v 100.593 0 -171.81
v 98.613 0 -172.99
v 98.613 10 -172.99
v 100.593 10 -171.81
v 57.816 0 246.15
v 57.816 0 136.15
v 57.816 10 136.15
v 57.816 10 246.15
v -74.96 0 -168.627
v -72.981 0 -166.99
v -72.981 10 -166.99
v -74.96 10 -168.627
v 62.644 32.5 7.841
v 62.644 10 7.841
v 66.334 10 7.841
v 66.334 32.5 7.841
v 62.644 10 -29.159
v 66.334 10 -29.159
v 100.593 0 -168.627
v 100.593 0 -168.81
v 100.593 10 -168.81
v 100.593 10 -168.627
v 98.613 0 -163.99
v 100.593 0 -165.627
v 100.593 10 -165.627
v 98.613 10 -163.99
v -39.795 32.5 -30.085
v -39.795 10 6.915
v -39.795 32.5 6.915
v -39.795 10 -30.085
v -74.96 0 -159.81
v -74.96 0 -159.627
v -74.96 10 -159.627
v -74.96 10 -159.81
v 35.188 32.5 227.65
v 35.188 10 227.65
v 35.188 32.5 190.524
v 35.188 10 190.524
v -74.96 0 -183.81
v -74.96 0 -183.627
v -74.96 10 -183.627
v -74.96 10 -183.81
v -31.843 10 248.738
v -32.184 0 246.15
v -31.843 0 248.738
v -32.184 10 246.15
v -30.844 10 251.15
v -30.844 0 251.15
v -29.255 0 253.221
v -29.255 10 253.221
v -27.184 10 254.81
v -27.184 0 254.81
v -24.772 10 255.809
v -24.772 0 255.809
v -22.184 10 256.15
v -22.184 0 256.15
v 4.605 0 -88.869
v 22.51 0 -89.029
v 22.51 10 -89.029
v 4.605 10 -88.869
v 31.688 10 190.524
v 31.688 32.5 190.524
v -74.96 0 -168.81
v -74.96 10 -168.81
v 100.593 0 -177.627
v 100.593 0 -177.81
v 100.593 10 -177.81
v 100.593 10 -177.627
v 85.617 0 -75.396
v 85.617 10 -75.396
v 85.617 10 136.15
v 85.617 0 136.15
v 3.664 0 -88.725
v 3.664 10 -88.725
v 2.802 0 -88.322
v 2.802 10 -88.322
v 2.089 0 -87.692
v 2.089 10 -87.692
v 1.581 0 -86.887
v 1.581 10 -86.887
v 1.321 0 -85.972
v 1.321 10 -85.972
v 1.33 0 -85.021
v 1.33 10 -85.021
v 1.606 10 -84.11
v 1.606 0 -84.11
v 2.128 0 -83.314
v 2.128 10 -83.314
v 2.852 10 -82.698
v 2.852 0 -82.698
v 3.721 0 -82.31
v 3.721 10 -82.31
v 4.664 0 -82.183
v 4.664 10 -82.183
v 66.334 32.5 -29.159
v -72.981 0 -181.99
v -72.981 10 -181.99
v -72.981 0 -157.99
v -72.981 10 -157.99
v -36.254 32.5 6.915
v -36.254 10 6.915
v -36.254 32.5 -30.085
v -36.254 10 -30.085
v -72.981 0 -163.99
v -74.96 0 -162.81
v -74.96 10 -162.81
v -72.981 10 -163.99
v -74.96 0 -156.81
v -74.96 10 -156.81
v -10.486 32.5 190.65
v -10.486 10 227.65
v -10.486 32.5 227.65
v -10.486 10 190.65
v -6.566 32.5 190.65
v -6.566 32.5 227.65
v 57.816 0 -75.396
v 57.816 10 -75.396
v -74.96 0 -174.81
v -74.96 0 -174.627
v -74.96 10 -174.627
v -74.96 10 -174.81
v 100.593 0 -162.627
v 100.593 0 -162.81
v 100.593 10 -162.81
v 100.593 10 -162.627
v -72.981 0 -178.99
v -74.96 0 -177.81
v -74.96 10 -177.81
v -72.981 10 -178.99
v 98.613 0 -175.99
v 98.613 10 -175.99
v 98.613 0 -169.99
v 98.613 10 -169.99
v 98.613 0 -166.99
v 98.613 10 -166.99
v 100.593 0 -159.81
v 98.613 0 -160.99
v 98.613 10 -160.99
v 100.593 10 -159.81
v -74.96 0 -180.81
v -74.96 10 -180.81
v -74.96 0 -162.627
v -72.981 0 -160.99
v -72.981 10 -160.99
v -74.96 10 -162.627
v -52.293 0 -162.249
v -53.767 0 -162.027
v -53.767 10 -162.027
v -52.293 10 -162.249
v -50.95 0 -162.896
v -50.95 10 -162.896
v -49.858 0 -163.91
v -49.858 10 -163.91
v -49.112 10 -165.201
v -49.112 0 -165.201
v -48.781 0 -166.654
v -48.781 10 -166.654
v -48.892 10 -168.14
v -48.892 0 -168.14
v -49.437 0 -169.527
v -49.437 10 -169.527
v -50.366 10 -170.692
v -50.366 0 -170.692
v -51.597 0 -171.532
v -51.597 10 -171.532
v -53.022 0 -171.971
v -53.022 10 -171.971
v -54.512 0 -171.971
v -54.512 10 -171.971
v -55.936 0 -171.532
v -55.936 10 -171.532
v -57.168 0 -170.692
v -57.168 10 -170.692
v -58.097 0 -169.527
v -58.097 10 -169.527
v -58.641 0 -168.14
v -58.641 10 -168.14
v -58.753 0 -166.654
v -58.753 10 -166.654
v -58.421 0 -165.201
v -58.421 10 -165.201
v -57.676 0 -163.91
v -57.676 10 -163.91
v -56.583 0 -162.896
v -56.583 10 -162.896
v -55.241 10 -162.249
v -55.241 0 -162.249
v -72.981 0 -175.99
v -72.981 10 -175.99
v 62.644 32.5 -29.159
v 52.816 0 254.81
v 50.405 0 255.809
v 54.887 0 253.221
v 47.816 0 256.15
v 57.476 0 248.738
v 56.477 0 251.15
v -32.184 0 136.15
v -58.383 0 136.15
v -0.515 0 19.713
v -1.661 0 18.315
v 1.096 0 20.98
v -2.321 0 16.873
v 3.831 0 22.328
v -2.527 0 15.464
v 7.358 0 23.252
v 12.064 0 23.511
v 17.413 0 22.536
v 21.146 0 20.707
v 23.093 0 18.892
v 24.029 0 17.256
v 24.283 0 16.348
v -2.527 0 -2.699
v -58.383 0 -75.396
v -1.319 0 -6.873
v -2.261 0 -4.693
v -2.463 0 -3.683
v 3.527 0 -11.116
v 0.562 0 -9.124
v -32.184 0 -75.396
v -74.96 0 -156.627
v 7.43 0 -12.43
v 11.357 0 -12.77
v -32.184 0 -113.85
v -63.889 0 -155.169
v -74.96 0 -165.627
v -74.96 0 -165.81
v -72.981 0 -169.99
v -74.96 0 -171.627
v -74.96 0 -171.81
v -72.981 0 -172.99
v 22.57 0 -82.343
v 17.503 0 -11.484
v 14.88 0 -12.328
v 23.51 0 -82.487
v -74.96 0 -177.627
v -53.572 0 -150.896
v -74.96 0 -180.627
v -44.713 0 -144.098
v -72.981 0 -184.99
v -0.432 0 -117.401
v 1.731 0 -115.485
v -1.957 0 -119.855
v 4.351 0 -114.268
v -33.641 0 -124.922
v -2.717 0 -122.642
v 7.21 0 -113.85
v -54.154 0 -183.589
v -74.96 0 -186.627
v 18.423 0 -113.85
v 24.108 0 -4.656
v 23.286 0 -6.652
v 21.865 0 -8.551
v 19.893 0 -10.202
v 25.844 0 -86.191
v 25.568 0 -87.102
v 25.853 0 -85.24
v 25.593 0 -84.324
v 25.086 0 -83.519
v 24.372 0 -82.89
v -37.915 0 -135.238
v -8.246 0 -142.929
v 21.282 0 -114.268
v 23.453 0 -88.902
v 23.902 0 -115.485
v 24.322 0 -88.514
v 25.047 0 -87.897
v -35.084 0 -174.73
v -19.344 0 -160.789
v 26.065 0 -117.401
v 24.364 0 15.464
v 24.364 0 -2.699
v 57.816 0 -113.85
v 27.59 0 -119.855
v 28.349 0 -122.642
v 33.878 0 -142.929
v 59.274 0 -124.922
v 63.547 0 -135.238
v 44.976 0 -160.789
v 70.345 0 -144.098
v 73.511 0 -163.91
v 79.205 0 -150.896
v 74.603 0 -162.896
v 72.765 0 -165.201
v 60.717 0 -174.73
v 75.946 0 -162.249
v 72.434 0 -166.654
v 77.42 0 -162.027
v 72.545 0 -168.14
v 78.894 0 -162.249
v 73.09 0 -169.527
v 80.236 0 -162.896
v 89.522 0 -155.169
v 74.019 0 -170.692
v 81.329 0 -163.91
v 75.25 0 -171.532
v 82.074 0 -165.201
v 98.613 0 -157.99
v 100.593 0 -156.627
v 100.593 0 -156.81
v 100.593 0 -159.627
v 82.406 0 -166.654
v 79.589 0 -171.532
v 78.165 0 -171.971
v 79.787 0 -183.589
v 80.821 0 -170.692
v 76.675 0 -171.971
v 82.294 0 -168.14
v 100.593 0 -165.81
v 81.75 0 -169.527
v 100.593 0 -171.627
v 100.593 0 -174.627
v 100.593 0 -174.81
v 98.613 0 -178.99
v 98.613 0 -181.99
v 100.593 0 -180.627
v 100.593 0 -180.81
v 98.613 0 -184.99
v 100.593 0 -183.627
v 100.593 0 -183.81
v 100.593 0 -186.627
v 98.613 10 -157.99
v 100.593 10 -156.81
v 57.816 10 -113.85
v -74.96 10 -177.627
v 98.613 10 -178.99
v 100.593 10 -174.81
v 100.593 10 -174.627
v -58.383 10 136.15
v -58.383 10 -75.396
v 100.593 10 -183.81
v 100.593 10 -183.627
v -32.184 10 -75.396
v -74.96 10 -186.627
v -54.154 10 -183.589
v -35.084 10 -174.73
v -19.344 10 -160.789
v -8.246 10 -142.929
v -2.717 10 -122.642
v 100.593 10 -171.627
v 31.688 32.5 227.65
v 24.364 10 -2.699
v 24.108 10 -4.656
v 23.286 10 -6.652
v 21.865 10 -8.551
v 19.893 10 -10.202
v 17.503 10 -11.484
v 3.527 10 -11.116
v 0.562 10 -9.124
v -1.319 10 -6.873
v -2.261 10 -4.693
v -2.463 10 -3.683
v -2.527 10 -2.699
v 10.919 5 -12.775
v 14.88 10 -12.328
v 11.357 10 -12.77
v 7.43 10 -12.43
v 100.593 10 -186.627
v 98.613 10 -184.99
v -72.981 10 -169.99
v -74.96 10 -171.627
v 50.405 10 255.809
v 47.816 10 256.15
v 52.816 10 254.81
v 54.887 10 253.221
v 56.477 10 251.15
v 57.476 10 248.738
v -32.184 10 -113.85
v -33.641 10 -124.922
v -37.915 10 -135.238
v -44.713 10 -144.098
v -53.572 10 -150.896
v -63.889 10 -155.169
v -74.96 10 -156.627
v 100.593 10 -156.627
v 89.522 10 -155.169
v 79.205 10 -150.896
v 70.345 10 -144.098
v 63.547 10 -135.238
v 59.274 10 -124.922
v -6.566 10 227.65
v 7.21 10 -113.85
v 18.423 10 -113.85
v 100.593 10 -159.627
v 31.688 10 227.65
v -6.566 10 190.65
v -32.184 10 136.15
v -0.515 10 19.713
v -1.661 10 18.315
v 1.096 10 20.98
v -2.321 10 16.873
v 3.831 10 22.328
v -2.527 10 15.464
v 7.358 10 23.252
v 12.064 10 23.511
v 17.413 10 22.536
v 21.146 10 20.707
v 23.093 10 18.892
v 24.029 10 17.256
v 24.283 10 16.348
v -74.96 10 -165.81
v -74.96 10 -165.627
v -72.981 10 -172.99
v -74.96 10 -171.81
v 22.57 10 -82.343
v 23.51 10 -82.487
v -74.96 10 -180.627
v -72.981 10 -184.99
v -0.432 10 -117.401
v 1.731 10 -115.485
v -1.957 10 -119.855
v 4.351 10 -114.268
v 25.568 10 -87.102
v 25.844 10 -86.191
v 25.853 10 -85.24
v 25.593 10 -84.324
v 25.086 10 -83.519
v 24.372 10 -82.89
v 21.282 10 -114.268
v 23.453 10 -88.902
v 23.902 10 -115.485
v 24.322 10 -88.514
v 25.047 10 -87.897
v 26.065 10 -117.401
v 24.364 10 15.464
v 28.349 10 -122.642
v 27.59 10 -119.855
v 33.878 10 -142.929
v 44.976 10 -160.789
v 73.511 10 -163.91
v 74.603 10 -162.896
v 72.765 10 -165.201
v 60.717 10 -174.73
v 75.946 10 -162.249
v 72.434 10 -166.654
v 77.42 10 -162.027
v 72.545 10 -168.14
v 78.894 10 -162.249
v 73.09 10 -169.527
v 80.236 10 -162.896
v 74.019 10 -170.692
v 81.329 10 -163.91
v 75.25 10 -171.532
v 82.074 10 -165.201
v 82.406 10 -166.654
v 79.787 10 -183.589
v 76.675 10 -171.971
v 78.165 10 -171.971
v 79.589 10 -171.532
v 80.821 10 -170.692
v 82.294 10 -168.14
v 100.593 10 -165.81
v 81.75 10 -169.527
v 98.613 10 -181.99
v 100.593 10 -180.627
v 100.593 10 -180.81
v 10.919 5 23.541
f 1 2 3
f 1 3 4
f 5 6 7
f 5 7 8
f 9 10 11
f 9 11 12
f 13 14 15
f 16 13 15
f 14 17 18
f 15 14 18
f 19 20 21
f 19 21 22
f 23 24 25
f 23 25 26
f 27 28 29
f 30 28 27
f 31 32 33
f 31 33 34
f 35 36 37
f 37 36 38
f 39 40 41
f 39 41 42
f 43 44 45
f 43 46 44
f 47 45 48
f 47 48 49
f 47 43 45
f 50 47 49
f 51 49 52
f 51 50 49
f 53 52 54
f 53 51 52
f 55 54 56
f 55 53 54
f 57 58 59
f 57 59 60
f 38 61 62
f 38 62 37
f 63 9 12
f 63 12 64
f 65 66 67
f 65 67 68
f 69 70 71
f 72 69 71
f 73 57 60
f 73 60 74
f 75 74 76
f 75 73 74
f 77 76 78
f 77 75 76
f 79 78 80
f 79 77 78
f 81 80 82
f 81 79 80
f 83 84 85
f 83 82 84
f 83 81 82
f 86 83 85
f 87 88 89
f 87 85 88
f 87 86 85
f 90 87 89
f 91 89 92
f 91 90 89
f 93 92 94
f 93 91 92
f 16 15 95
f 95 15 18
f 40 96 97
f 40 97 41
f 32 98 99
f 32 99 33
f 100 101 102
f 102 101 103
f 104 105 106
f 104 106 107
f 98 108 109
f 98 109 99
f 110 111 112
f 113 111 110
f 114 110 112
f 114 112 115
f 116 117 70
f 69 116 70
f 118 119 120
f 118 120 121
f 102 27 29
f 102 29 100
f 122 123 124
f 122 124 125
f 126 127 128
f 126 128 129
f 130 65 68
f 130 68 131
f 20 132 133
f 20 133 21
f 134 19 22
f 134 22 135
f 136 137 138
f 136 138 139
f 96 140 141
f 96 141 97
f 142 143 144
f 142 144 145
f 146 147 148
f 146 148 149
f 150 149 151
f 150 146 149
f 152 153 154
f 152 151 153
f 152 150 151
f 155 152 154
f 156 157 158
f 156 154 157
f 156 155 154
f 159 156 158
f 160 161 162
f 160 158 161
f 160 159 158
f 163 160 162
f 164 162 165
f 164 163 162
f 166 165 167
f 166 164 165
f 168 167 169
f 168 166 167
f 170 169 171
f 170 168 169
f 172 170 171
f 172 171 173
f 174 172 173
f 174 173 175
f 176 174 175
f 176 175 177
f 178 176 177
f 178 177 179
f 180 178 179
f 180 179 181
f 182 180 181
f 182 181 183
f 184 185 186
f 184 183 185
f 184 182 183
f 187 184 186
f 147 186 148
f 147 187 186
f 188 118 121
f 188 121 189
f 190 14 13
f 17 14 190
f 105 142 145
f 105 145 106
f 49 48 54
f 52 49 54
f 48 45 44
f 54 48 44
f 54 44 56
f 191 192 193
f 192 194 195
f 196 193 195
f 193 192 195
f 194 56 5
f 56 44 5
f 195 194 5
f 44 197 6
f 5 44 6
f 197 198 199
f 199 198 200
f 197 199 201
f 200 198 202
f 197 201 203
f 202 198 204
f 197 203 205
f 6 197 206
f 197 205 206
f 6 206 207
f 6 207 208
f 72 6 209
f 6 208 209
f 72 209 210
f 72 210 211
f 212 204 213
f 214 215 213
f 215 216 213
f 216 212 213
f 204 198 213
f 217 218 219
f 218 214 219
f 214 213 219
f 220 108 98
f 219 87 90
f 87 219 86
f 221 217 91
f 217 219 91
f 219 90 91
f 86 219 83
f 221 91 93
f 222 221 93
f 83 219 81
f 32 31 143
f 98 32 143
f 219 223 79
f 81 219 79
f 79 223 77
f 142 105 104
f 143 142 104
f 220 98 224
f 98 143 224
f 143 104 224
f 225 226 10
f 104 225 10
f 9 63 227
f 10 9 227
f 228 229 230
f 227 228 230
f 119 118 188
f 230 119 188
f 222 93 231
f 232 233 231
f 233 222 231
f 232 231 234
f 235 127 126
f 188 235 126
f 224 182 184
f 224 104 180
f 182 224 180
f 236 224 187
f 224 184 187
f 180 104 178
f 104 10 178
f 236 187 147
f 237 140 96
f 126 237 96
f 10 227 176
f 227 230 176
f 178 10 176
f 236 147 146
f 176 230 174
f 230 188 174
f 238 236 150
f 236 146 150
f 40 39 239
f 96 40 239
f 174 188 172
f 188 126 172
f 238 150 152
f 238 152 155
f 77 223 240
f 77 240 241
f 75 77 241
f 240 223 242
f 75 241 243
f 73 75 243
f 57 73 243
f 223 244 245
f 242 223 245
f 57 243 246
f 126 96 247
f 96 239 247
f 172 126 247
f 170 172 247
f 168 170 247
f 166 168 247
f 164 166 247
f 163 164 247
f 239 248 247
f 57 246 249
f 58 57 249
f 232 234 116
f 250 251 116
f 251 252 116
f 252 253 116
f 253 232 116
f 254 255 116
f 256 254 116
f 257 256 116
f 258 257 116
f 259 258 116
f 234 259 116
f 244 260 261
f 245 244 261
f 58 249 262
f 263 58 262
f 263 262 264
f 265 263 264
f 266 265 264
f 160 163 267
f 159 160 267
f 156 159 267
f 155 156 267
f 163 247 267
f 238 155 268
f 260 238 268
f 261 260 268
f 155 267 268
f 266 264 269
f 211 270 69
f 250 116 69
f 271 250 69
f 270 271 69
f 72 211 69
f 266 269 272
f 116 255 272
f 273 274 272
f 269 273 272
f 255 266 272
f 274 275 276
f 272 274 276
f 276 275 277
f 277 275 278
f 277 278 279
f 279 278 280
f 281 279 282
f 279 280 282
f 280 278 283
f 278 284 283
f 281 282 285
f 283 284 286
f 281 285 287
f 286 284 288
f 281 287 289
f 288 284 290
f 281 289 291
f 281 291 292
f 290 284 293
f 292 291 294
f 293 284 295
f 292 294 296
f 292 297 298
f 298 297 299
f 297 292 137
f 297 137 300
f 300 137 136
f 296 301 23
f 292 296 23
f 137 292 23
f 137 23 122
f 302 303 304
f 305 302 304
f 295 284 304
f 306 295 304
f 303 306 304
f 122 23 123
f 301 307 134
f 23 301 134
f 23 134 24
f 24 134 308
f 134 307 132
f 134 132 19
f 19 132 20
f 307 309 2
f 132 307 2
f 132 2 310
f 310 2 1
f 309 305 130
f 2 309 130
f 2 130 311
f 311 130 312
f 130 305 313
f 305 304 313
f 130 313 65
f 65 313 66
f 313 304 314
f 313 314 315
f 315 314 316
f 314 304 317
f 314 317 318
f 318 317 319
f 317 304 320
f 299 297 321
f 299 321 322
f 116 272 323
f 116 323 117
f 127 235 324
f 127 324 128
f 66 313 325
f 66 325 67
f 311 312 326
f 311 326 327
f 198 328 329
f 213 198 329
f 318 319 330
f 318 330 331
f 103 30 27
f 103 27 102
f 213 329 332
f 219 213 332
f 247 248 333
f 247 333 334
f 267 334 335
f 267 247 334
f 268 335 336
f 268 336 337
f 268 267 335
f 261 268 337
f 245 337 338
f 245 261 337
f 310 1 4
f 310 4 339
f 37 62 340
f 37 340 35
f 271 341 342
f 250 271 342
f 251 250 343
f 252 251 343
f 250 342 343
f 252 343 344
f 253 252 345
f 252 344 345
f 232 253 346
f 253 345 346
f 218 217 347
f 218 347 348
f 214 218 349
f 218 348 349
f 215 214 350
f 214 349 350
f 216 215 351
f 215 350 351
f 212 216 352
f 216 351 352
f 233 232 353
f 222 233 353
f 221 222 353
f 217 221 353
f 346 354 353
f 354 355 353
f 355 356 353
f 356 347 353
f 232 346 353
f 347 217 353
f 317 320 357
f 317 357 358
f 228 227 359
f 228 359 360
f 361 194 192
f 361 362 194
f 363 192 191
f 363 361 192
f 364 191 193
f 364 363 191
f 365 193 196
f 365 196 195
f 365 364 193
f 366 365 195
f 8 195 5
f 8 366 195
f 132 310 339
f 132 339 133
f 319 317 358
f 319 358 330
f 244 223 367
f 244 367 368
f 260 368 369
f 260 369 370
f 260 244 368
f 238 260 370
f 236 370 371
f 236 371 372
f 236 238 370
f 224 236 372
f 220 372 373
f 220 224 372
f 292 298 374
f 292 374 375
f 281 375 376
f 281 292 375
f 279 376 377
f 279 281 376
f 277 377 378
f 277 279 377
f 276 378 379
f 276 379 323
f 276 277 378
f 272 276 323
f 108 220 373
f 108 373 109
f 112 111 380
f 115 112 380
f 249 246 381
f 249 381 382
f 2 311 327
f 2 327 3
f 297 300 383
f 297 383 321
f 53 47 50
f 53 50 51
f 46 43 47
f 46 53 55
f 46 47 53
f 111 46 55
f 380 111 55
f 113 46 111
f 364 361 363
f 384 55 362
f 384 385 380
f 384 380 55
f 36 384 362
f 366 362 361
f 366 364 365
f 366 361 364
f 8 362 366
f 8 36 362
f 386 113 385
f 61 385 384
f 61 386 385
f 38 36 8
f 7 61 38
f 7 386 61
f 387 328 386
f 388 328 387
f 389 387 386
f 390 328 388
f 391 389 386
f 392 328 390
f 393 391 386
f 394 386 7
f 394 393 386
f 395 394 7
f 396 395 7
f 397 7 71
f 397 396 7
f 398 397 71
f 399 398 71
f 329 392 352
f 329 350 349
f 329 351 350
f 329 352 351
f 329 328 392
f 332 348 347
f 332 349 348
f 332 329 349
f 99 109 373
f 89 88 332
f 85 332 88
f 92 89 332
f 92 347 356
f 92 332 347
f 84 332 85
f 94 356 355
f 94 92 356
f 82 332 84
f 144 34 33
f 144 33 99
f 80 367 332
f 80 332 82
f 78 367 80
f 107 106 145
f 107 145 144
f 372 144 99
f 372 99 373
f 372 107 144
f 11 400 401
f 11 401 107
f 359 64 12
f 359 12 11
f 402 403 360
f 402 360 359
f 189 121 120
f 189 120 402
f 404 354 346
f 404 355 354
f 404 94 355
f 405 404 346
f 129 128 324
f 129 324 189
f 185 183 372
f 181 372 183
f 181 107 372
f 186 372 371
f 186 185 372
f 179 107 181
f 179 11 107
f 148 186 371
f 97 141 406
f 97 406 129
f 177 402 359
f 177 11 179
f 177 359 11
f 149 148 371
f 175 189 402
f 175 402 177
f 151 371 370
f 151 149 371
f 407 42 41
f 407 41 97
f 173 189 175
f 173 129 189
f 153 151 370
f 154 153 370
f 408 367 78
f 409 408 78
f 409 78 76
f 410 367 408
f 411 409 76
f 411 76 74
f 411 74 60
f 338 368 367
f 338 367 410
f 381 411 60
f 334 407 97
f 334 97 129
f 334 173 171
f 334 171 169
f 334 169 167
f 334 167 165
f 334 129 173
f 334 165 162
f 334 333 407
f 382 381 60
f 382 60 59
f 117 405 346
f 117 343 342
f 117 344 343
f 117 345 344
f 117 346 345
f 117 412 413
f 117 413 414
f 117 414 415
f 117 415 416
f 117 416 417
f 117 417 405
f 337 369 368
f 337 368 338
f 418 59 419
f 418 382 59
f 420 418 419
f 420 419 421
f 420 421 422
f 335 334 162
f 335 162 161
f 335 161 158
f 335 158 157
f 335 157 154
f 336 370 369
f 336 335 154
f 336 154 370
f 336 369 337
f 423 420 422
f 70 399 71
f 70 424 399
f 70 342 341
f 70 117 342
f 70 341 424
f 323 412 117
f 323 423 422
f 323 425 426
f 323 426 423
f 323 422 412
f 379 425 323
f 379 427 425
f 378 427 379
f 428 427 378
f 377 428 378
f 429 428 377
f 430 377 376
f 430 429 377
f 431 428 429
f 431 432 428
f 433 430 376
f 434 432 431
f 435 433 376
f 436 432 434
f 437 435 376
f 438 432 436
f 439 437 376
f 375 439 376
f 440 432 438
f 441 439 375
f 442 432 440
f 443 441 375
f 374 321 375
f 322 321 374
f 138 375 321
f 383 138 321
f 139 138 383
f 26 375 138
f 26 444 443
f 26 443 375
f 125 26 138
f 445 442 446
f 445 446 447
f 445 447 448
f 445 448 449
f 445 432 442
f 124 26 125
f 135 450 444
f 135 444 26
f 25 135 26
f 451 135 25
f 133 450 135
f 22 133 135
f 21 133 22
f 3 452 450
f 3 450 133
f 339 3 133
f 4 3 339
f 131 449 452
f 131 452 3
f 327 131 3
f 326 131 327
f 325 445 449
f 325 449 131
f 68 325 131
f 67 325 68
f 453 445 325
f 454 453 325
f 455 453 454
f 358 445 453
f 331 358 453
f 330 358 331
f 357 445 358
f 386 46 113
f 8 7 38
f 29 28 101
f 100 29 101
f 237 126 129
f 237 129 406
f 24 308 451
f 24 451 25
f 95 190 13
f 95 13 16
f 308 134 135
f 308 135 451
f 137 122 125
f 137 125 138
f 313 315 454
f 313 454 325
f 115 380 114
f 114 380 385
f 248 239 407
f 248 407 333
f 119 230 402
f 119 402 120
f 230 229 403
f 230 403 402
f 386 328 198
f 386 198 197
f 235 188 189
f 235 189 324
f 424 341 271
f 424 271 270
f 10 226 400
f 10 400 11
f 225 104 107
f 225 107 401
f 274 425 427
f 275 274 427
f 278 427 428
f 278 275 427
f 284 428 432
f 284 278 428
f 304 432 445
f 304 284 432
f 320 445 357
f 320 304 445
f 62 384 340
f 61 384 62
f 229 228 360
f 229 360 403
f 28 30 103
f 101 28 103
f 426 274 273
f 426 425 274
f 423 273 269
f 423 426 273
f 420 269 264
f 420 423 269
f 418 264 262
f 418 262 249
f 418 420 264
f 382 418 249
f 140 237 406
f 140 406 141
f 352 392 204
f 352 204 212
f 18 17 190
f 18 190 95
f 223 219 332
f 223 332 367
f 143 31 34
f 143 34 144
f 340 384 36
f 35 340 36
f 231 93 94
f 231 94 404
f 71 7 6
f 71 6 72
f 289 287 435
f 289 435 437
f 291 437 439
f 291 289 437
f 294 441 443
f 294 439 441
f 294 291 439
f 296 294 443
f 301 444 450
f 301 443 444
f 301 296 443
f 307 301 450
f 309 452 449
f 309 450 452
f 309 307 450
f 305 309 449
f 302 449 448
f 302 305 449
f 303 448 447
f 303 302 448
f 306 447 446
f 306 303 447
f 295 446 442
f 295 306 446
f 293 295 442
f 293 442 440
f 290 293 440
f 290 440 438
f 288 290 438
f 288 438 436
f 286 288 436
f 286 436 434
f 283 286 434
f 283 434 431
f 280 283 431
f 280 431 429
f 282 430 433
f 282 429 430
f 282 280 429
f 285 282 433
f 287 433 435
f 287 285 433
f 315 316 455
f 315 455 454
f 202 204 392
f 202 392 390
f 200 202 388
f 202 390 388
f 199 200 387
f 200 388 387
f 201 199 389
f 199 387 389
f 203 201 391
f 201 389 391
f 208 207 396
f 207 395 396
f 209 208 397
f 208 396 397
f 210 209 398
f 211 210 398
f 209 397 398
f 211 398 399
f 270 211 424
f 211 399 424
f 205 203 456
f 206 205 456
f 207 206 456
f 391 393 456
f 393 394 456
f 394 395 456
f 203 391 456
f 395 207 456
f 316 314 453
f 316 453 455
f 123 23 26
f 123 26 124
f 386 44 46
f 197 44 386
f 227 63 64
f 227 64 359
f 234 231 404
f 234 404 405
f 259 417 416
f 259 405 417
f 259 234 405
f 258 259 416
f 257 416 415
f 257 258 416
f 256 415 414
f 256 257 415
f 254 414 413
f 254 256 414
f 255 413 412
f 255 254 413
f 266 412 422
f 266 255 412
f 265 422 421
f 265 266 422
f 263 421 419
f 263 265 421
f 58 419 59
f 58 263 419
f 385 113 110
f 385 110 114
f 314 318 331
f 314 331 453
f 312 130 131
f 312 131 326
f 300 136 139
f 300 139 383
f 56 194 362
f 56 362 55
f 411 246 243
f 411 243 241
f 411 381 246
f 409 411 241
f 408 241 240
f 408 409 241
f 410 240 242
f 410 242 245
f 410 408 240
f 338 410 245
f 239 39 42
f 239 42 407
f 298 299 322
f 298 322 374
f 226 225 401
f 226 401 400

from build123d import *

# Parameters (mm, degrees)
BOSS_EXTRUDE1_DEPTH     = 10
SKETCH9_W               = 3.92
SKETCH9_H               = 37
SKETCH9_W_2             = 3.5
SKETCH9_H_2             = 37.126500488
SKETCH9_W_3             = 3.541288456
SKETCH9_W_4             = 3.69
BOSS_EXTRUDE5_DEPTH     = 22.5
CUT_EXTRUDE1_DEPTH      = 277.112166613
CUT_EXTRUDE1_DEPTH_BACK = 277.112166613
SKETCH9_3_R             = 5
FILLET1_R               = 10
FILLET2_R               = 10
FILLET3_R               = 10
FILLET4_R               = 10
BOSS_EXTRUDE6_DEPTH     = 10
SKETCH11_W              = 144
SKETCH11_H              = 11.545986826
BOSS_EXTRUDE7_DEPTH     = 10
CUT_EXTRUDE2_DEPTH      = 10


with BuildPart() as part:
    # Sketch1 → Boss-Extrude1 (new body)
    with BuildSketch(Plane(origin=(0, 0, 0), x_dir=(1, 0, 0), z_dir=(0, 1, 0))):
        with BuildLine():
            Line((-74.960217971, 156.809599724), (-74.960217971, 156.626779496))
            ThreePointArc((-74.960217971, 156.626779496), (-44.712594055, 144.09780344), (-32.183617999, 113.850179524))
            Line((-32.183617999, 113.850179524), (-32.183617999, -256.149820476))
            Line((-32.183617999, -256.149820476), (57.816382001, -256.149820476))
            Line((57.816382001, -256.149820476), (57.816382001, 113.850179524))
            ThreePointArc((57.816382001, 113.850179524), (70.345358056, 144.09780344), (100.592981972, 156.626779496))
            Line((100.592981972, 156.626779496), (100.592981972, 156.809599724))
            Line((100.592981972, 156.809599724), (98.613342132, 157.989769628))
            Line((98.613342132, 157.989769628), (100.592981972, 159.626779496))
            Line((100.592981972, 159.626779496), (100.592981972, 159.809599724))
            Line((100.592981972, 159.809599724), (98.613342132, 160.989769628))
            Line((98.613342132, 160.989769628), (100.592981972, 162.626779496))
            Line((100.592981972, 162.626779496), (100.592981972, 162.809599724))
            Line((100.592981972, 162.809599724), (98.613342132, 163.989769628))
            Line((98.613342132, 163.989769628), (100.592981972, 165.626779496))
            Line((100.592981972, 165.626779496), (100.592981972, 165.809599724))
            Line((100.592981972, 165.809599724), (98.613342132, 166.989769628))
            Line((98.613342132, 166.989769628), (100.592981972, 168.626779496))
            Line((100.592981972, 168.626779496), (100.592981972, 168.809599724))
            Line((100.592981972, 168.809599724), (98.613342132, 169.989769628))
            Line((98.613342132, 169.989769628), (100.592981972, 171.626779496))
            Line((100.592981972, 171.626779496), (100.592981972, 171.809599724))
            Line((100.592981972, 171.809599724), (98.613342132, 172.989769628))
            Line((98.613342132, 172.989769628), (100.592981972, 174.626779496))
            Line((100.592981972, 174.626779496), (100.592981972, 174.809599724))
            Line((100.592981972, 174.809599724), (98.613342132, 175.989769628))
            Line((98.613342132, 175.989769628), (100.592981972, 177.626779496))
            Line((100.592981972, 177.626779496), (100.592981972, 177.809599724))
            Line((100.592981972, 177.809599724), (98.613342132, 178.989769628))
            Line((98.613342132, 178.989769628), (100.592981972, 180.626779496))
            Line((100.592981972, 180.626779496), (100.592981972, 180.809599724))
            Line((100.592981972, 180.809599724), (98.613342132, 181.989769628))
            Line((98.613342132, 181.989769628), (100.592981972, 183.626779496))
            Line((100.592981972, 183.626779496), (100.592981972, 183.809599724))
            Line((100.592981972, 183.809599724), (98.613342132, 184.989769628))
            Line((98.613342132, 184.989769628), (100.592981972, 186.626779496))
            ThreePointArc((100.592981972, 186.626779496), (49.132154621, 165.311006876), (27.816382001, 113.850179524))
            Line((27.816382001, 113.850179524), (12.816382001, 113.850179524))
            Line((12.816382001, 113.850179524), (-2.183617999, 113.850179524))
            ThreePointArc((-2.183617999, 113.850179524), (-23.499390619, 165.311006876), (-74.960217971, 186.626779496))
            Line((-74.960217971, 186.626779496), (-72.980578131, 184.989769628))
            Line((-72.980578131, 184.989769628), (-74.960217971, 183.809599724))
            Line((-74.960217971, 183.809599724), (-74.960217971, 183.626779496))
            Line((-74.960217971, 183.626779496), (-72.980578131, 181.989769628))
            Line((-72.980578131, 181.989769628), (-74.960217971, 180.809599724))
            Line((-74.960217971, 180.809599724), (-74.960217971, 180.626779496))
            Line((-74.960217971, 180.626779496), (-72.980578131, 178.989769628))
            Line((-72.980578131, 178.989769628), (-74.960217971, 177.809599724))
            Line((-74.960217971, 177.809599724), (-74.960217971, 177.626779496))
            Line((-74.960217971, 177.626779496), (-72.980578131, 175.989769628))
            Line((-72.980578131, 175.989769628), (-74.960217971, 174.809599724))
            Line((-74.960217971, 174.809599724), (-74.960217971, 174.626779496))
            Line((-74.960217971, 174.626779496), (-72.980578131, 172.989769628))
            Line((-72.980578131, 172.989769628), (-74.960217971, 171.809599724))
            Line((-74.960217971, 171.809599724), (-74.960217971, 171.626779496))
            Line((-74.960217971, 171.626779496), (-72.980578131, 169.989769628))
            Line((-72.980578131, 169.989769628), (-74.960217971, 168.809599724))
            Line((-74.960217971, 168.809599724), (-74.960217971, 168.626779496))
            Line((-74.960217971, 168.626779496), (-72.980578131, 166.989769628))
            Line((-72.980578131, 166.989769628), (-74.960217971, 165.809599724))
            Line((-74.960217971, 165.809599724), (-74.960217971, 165.626779496))
            Line((-74.960217971, 165.626779496), (-72.980578131, 163.989769628))
            Line((-72.980578131, 163.989769628), (-74.960217971, 162.809599724))
            Line((-74.960217971, 162.809599724), (-74.960217971, 162.626779496))
            Line((-74.960217971, 162.626779496), (-72.980578131, 160.989769628))
            Line((-72.980578131, 160.989769628), (-74.960217971, 159.809599724))
            Line((-74.960217971, 159.809599724), (-74.960217971, 159.626779496))
            Line((-74.960217971, 159.626779496), (-72.980578131, 157.989769628))
            Line((-72.980578131, 157.989769628), (-74.960217971, 156.809599724))
        make_face()
    extrude(amount=BOSS_EXTRUDE1_DEPTH)

    # Sketch9 → Boss-Extrude5 (add)
    with BuildSketch(Plane(origin=(0, 10, 0), x_dir=(1, 0, 0), z_dir=(0, 1, 0))):
        with Locations((-8.526417695, -209.150271155)):
            Rectangle(SKETCH9_W, SKETCH9_H)
        with Locations((33.437512474, -209.087020911)):
            Rectangle(SKETCH9_W_2, SKETCH9_H_2)
        with Locations((-38.024500938, 11.585050009)):
            Rectangle(SKETCH9_W_3, SKETCH9_H)
        with Locations((64.489482657, 10.658923544)):
            Rectangle(SKETCH9_W_4, SKETCH9_H)
    extrude(amount=BOSS_EXTRUDE5_DEPTH)


with BuildPart() as boss_extrude5_piece_1:
    # of the separate pieces the step leaves, piece 1, a body of its own (boss_extrude5_pieces)
    add(part.part.solids().sort_by_distance((-2.183617999, 0, -113.850179524))[0])

    # Sketch9<3> → Cut-Extrude1 (cut, two sides: drawn at the far end of the back side and taken through both)
    with BuildSketch(Plane(origin=(0, 10, 0), x_dir=(1, 0, 0), z_dir=(0, 1, 0)).offset(-CUT_EXTRUDE1_DEPTH_BACK)):
        with BuildLine():
            Line((4.664282568, 82.183183807), (22.569718474, 82.34305377))
            ThreePointArc((22.569718474, 82.34305377), (25.882601331, 85.71562821), (22.510026891, 89.028511067))
            Line((22.510026891, 89.028511067), (4.604590985, 88.868641103))
            ThreePointArc((4.604590985, 88.868641103), (1.291708128, 85.496066664), (4.664282568, 82.183183807))
        make_face()
        with Locations((-53.766761214, 167.027229772)):
            Circle(SKETCH9_3_R)
        with Locations((77.419859554, 167.027229772)):
            Circle(SKETCH9_3_R)
    extrude(amount=CUT_EXTRUDE1_DEPTH + CUT_EXTRUDE1_DEPTH_BACK, mode=Mode.SUBTRACT)

    # Fillet1
    fillet1_edges = [boss_extrude5_piece_1.edges().sort_by_distance(p)[0] for p in [
        (-32.183617999, 5, 256.149820476),
    ]]
    fillet(fillet1_edges, radius=FILLET1_R)

    # Fillet2
    fillet2_edges = [boss_extrude5_piece_1.edges().sort_by_distance(p)[0] for p in [
        (57.816382001, 5, 256.149820476),
    ]]
    fillet(fillet2_edges, radius=FILLET2_R)

    # Fillet3
    fillet3_edges = [boss_extrude5_piece_1.edges().sort_by_distance(p)[0] for p in [
        (27.816382001, 5, -113.850179524),
    ]]
    fillet(fillet3_edges, radius=FILLET3_R)

    # Fillet4
    fillet4_edges = [boss_extrude5_piece_1.edges().sort_by_distance(p)[0] for p in [
        (-2.183617999, 5, -113.850179524),
    ]]
    fillet(fillet4_edges, radius=FILLET4_R)

    # Sketch10 → Boss-Extrude6 (add)
    with BuildSketch(Plane(origin=(0, 10, 0), x_dir=(1, 0, 0), z_dir=(0, 1, 0))):
        Polygon((-58.382999479, 75.396165624), (85.617000521, 75.396165624), (85.617000521, -124.603834376), (13.617000521, -124.603834376), (-58.382999479, -124.603834376), align=None)
    extrude(amount=-BOSS_EXTRUDE6_DEPTH)

    # Sketch11 → Boss-Extrude7 (add)
    with BuildSketch(Plane(origin=(0, 10, 0), x_dir=(1, 0, 0), z_dir=(0, 1, 0))):
        with Locations((13.617000521, -130.376827789)):
            Rectangle(SKETCH11_W, SKETCH11_H)
    extrude(amount=-BOSS_EXTRUDE7_DEPTH)

    # Sketch12 → Cut-Extrude2 (cut, symmetric)
    with BuildSketch(Plane(origin=(0, 10, 0), x_dir=(1, 0, 0), z_dir=(0, 1, 0))):
        with BuildLine():
            Line((-2.527057268, -15.463769637), (-2.527057268, 2.698732135))
            add(Edge.make_bspline(
                [(24.364249195, 2.698732135), (24.364249195, 12.775076767), (10.918595964, 12.775076767), (-2.527057268, 12.775076767), (-2.527057268, 2.698732135)],
                knots=[0, 0, 0, 1.570796327, 1.570796327, 3.141592654, 3.141592654, 3.141592654], degree=2, weights=[1, 0.707106781, 1, 0.707106781, 1]))
            Line((24.364249195, 2.698732135), (24.364249195, -15.463769637))
            add(Edge.make_bspline(
                [(-2.527057268, -15.463769637), (-2.527057268, -23.540766762), (10.918595964, -23.540766762), (24.364249195, -23.540766762), (24.364249195, -15.463769637)],
                knots=[0, 0, 0, 1.570796327, 1.570796327, 3.141592654, 3.141592654, 3.141592654], degree=2, weights=[1, 0.707106781, 1, 0.707106781, 1]))
        make_face()
    extrude(amount=CUT_EXTRUDE2_DEPTH, both=True, mode=Mode.SUBTRACT)


with BuildPart() as boss_extrude5_piece_2:
    # of the separate pieces the step leaves, piece 2, a body of its own (boss_extrude5_pieces)
    add(part.part.solids().sort_by_distance((62.644482657, 10, -29.158923544))[0])


with BuildPart() as boss_extrude5_piece_3:
    # of the separate pieces the step leaves, piece 3, a body of its own (boss_extrude5_pieces)
    add(part.part.solids().sort_by_distance((-39.795145166, 10, -30.085050009))[0])


solid = Compound([boss_extrude5_piece_1.part, boss_extrude5_piece_2.part, boss_extrude5_piece_3.part])
